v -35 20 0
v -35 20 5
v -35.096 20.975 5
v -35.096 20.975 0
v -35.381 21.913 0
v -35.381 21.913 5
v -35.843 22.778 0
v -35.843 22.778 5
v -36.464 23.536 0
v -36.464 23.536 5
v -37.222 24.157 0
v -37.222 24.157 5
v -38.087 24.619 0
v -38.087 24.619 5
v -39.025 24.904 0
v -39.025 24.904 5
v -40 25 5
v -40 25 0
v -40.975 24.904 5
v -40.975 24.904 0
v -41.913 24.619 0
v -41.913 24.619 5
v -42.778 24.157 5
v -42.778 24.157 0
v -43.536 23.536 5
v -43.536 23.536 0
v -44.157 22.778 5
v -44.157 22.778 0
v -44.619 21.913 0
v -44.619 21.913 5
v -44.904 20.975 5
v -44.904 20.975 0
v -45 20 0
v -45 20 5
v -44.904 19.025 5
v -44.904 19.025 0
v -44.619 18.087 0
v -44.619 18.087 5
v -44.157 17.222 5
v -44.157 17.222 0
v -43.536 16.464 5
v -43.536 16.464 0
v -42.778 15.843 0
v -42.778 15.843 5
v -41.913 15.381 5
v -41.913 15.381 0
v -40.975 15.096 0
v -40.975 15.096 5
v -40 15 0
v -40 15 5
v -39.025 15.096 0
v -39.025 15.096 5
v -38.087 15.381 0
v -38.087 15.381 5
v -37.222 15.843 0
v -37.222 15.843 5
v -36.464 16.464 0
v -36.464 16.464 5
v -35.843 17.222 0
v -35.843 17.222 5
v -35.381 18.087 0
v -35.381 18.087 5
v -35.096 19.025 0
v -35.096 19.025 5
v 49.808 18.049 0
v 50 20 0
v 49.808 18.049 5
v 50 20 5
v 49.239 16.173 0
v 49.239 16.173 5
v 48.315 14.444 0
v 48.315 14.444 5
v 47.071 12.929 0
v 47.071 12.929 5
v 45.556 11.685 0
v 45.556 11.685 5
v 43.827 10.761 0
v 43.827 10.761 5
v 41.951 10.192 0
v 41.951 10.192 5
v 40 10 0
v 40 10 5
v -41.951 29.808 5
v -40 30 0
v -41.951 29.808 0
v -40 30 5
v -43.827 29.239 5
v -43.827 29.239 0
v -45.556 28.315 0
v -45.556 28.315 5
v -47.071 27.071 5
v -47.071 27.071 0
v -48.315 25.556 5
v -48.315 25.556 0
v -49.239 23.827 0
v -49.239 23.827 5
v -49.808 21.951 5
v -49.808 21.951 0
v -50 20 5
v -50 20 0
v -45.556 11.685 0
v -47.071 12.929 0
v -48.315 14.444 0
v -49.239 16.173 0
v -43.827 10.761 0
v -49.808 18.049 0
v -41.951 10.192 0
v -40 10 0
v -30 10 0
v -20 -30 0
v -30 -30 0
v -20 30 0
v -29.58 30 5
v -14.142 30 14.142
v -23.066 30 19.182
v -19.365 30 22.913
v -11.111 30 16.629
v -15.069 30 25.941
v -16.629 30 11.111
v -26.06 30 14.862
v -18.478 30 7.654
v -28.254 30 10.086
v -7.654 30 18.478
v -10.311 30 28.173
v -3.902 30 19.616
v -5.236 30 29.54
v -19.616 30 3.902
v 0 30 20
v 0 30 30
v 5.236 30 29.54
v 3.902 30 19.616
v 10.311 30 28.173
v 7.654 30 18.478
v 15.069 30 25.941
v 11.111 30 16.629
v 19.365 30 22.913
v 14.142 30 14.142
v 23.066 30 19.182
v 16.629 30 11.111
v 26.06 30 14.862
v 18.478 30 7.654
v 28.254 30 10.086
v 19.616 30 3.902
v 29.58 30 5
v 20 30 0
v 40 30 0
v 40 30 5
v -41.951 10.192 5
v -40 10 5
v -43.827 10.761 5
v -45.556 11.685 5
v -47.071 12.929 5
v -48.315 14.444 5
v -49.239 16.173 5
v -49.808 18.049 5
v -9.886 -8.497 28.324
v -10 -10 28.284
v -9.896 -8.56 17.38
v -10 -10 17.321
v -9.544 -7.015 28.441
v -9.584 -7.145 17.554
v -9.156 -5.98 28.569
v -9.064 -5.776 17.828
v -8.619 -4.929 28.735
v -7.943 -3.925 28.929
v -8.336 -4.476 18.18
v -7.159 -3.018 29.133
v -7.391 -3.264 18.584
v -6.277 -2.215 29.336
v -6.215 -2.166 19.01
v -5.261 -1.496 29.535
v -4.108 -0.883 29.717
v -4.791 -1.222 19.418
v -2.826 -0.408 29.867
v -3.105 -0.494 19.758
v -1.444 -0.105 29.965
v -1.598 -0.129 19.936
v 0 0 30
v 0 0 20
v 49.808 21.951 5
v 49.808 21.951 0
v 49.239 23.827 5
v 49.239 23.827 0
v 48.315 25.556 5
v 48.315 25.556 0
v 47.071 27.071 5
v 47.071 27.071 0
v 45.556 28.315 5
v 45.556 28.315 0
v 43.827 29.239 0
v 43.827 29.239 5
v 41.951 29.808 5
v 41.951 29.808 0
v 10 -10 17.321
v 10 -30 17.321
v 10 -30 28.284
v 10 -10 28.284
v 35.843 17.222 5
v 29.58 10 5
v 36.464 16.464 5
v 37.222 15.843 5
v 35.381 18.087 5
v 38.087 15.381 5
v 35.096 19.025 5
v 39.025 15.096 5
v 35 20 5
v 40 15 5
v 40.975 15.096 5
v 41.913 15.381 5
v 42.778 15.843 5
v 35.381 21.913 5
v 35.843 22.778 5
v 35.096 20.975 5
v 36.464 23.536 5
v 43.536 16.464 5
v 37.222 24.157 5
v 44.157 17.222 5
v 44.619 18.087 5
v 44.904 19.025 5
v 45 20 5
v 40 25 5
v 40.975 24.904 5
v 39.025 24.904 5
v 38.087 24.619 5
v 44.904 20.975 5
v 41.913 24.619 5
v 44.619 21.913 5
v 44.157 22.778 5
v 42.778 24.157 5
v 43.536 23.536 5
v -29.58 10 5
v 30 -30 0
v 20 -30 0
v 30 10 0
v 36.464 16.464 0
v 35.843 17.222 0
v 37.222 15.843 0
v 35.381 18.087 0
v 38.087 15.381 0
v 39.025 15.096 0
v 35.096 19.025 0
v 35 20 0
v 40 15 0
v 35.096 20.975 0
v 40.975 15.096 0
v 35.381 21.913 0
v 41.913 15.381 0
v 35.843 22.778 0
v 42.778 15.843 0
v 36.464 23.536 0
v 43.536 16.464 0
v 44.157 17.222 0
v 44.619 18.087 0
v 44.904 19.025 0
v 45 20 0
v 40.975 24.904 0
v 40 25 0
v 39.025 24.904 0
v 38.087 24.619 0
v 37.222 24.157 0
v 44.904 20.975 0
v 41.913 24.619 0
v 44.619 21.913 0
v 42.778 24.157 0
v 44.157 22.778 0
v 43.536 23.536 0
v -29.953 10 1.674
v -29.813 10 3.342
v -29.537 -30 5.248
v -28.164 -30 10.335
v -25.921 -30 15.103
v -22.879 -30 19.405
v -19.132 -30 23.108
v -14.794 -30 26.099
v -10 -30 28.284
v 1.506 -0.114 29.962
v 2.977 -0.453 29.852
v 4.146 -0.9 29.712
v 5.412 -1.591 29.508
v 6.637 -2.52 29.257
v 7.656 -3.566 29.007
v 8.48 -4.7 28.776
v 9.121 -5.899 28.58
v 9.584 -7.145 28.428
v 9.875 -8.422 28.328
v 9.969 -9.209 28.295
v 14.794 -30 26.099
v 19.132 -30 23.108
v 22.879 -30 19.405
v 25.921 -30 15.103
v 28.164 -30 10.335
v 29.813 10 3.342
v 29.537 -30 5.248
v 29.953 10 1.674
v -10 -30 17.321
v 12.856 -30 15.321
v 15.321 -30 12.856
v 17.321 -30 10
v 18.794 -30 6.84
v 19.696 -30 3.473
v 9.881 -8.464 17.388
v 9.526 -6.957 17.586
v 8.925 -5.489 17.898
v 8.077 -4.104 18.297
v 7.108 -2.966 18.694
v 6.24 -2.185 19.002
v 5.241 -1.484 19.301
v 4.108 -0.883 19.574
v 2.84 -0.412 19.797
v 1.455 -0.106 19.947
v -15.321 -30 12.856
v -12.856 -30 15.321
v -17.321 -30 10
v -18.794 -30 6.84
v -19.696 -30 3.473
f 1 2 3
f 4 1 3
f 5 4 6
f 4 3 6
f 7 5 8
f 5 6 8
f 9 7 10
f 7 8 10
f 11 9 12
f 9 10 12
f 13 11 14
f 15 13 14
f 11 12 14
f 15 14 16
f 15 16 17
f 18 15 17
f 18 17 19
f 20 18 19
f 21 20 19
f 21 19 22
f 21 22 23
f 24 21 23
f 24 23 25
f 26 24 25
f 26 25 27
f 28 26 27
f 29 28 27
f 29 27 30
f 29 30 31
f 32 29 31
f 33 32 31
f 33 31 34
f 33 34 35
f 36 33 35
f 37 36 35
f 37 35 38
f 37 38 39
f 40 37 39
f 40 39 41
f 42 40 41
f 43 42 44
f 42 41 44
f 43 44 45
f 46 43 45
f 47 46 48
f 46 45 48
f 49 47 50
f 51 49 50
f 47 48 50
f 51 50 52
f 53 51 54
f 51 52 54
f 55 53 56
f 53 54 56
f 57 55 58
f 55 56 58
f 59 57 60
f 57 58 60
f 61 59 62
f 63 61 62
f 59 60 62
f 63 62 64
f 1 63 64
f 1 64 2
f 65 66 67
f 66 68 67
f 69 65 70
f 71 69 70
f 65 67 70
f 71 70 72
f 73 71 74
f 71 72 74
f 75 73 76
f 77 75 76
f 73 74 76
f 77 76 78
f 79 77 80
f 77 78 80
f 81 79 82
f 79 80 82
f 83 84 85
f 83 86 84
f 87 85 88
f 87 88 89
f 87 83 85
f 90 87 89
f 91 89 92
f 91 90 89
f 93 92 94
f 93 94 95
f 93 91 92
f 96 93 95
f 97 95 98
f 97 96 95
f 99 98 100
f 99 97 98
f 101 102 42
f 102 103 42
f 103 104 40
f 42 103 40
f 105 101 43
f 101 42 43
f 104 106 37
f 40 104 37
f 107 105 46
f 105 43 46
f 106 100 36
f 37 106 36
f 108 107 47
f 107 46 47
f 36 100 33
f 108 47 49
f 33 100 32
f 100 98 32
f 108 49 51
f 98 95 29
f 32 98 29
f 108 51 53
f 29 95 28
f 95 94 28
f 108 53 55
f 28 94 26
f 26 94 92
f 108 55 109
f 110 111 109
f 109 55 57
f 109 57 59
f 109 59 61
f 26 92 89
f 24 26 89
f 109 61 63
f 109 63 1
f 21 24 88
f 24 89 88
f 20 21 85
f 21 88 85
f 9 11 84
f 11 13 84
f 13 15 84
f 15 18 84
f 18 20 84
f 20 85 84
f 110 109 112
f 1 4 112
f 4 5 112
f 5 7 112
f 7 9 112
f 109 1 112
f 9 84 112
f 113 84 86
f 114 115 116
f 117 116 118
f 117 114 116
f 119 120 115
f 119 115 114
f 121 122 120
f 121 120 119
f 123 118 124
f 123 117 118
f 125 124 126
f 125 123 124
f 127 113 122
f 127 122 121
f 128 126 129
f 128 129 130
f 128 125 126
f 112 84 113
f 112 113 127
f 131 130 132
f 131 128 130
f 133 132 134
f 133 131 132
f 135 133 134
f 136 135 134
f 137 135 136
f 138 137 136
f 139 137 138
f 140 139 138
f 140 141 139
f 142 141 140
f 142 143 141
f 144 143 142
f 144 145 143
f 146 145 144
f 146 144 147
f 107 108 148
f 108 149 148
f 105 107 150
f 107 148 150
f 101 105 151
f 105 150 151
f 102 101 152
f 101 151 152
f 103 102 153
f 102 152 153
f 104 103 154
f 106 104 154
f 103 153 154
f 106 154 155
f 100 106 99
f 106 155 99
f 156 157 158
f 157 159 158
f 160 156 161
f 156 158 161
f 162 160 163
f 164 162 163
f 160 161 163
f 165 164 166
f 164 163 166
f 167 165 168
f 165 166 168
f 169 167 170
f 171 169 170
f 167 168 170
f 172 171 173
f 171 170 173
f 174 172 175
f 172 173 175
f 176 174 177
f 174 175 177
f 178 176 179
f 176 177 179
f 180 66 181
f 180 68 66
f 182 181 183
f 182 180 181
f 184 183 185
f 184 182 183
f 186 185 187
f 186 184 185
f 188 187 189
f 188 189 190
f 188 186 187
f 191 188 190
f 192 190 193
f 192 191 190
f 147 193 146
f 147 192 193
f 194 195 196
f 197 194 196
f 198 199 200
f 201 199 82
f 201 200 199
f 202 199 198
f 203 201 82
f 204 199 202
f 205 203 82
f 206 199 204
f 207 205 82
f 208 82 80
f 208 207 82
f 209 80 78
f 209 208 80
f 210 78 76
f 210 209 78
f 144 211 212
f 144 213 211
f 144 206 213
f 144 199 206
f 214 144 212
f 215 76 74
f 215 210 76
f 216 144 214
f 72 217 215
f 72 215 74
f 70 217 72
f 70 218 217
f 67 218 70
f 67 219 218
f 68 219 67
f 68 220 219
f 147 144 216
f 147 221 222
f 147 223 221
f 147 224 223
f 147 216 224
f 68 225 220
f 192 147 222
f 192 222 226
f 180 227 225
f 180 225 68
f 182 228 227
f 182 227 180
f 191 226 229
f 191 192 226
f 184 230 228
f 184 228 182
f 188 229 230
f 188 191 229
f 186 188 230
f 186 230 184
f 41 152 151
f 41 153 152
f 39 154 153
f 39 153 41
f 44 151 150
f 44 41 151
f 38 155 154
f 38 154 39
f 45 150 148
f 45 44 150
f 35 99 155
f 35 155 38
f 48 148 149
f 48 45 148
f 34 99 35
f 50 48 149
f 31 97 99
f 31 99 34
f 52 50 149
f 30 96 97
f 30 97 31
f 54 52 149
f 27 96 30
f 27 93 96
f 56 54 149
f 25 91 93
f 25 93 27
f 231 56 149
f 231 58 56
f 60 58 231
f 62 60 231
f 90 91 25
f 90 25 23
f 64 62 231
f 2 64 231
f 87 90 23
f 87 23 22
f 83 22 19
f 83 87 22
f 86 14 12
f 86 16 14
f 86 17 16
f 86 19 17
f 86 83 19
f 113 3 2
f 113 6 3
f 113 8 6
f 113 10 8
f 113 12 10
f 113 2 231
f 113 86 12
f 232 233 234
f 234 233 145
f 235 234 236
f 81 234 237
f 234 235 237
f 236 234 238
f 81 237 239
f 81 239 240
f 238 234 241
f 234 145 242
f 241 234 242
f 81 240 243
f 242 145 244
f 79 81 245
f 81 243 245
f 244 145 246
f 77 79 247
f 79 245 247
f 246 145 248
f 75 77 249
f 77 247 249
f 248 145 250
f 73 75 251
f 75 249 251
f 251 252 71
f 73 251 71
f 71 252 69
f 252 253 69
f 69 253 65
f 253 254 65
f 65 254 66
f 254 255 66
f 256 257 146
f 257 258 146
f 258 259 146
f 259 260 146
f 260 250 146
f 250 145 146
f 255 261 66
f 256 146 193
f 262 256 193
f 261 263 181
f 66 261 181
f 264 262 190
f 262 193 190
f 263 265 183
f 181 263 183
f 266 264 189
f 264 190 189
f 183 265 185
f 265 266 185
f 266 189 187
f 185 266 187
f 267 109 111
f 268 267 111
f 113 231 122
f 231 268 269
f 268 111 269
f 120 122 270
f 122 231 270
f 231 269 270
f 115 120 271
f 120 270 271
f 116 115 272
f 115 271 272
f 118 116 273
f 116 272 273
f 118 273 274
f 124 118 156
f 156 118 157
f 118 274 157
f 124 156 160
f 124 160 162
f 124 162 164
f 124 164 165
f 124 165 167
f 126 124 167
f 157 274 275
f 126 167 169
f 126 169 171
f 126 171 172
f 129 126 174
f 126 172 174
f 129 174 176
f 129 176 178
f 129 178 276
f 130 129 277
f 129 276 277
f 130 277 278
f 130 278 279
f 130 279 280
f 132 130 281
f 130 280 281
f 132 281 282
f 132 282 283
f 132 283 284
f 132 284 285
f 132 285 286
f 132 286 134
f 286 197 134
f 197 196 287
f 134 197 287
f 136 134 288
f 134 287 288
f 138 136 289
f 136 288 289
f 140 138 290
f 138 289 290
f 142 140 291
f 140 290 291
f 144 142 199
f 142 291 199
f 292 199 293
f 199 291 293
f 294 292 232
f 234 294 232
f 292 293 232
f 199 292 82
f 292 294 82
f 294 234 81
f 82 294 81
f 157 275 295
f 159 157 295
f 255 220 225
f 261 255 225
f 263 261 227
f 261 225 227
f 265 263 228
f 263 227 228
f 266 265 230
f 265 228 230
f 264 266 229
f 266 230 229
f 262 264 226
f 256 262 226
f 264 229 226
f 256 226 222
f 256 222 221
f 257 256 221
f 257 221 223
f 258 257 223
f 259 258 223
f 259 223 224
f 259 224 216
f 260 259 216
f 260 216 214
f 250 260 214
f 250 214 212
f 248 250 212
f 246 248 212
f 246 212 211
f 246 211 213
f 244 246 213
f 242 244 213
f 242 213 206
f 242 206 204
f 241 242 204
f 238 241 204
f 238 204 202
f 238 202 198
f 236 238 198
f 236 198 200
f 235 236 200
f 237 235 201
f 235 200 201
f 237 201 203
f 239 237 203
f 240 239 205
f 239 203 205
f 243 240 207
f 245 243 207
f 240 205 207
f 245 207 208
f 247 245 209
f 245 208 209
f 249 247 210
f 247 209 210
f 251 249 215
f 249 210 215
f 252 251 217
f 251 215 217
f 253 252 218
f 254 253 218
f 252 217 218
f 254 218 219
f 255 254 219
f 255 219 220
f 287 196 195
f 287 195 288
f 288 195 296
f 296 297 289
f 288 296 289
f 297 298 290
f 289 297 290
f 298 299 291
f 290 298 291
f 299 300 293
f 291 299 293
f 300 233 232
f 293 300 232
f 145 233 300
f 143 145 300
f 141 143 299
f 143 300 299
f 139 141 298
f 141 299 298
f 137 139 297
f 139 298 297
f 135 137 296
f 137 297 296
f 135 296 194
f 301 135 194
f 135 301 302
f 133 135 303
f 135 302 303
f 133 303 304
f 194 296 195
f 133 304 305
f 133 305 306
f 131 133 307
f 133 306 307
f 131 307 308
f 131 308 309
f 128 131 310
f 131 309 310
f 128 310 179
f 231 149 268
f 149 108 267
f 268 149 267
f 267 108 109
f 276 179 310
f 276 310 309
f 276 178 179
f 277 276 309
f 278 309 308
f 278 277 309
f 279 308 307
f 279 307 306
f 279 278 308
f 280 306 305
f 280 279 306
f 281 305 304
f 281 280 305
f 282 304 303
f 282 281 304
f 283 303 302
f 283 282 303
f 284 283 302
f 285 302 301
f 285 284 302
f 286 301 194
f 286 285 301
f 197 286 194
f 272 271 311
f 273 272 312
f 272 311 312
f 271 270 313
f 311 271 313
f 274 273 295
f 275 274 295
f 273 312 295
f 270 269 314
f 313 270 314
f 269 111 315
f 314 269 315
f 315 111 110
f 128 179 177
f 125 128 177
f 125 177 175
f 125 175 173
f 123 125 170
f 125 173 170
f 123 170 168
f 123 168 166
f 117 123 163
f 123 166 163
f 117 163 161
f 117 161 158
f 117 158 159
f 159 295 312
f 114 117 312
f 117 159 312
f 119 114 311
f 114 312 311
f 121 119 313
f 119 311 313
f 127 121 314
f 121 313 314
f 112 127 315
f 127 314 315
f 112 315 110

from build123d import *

# Parameters (mm, degrees)
F1_W      = 60
F1_H      = 60
F2_DEPTH  = 30
F4_DEPTH  = 60.001
F5_W      = 20
F5_H      = 20
F6_DEPTH  = 5
F7_W      = 20
F7_H      = 20
F8_DEPTH  = 5
F10_DEPTH = 20
F12_DEPTH = 40
F13_R     = 9.99999
F14_R     = 9.99999
F15_R     = 5
F16_DEPTH = 5.001
F17_R     = 5
F18_DEPTH = 5.001
F20_DEPTH = 30
F21_R     = 10
F22_R     = 9.99999


# Not quite as in the source:
# - a fillet or chamfer is up to 0.001 mm smaller than in the source, because OpenCascade refuses the exact size


with BuildPart() as f2:
    # F1 (on Top) → F2 (new body)
    with BuildSketch(Plane.XY):
        Rectangle(F1_W, F1_H)
    extrude(amount=F2_DEPTH)

    # F3 (on face) → F4 (cut, through all)
    with BuildSketch(Plane.XZ.offset(30)):
        with BuildLine():
            ThreePointArc((20, 0), (14.1421356237, 14.1421356237), (0, 20))
            Line((0, 20), (0, 0))
            Line((0, 0), (20, 0))
        make_face()
        with BuildLine():
            Line((0, 0), (0, 20))
            ThreePointArc((0, 20), (-14.1421356237, 14.1421356237), (-20, 0))
            Line((-20, 0), (0, 0))
        make_face()
    extrude(amount=-F4_DEPTH, mode=Mode.SUBTRACT)

    # F5 (on Top) → F6 (join)
    with BuildSketch(Plane.XY):
        with Locations((40, 20)):
            Rectangle(F5_W, F5_H)
    extrude(amount=F6_DEPTH)

    # F7 (on Top) → F8 (join)
    with BuildSketch(Plane.XY):
        with Locations((-40, 20)):
            Rectangle(F7_W, F7_H)
    extrude(amount=F8_DEPTH)

    # F9 (on face) → F10 (cut)
    with BuildSketch(Plane(origin=(0, 30, 0), x_dir=(-1, 0, 0), z_dir=(0, 1, 0))):
        with BuildLine():
            ThreePointArc((-29.5803989155, 5), (-19.3649167147, 22.9128784886), (4.28e-08, 30))
            Line((4.28e-08, 30), (-30, 30))
            Line((-30, 30), (-30, 5))
            Line((-30, 5), (-29.5803989155, 5))
        make_face()
        with BuildLine():
            ThreePointArc((4.28e-08, 30), (19.3649167474, 22.912878461), (29.5803989155, 5))
            Line((29.5803989155, 5), (30, 5))
            Line((30, 5), (30, 30))
            Line((30, 30), (4.28e-08, 30))
        make_face()
    extrude(amount=-F10_DEPTH, mode=Mode.SUBTRACT)

    # F11 (on face) → F12 (cut)
    with BuildSketch(Plane.XZ.offset(30)):
        with BuildLine():
            Line((-30, 30), (-30, 0))
            ThreePointArc((-30, 0), (-21.2132034683, 21.2132034029), (-9.24e-08, 30))
            Line((-9.24e-08, 30), (-30, 30))
        make_face()
        with BuildLine():
            ThreePointArc((-9.24e-08, 30), (21.2132034029, 21.2132034683), (30, 0))
            Line((30, 0), (30, 30))
            Line((30, 30), (-9.24e-08, 30))
        make_face()
    extrude(amount=-F12_DEPTH, mode=Mode.SUBTRACT)

    # F13 (radius 10 in the source; OpenCascade refuses exactly that, so slightly less here)
    f13_edges = [f2.edges().sort_by_distance(p)[0] for p in [
        (50, 30, 2.5),
        (50, 10, 2.5),
    ]]
    fillet(f13_edges, radius=F13_R)

    # F14 (radius 10 in the source; OpenCascade refuses exactly that, so slightly less here)
    f14_edges = [f2.edges().sort_by_distance(p)[0] for p in [
        (-50, 30, 2.5),
        (-50, 10, 2.5),
    ]]
    fillet(f14_edges, radius=F14_R)

    # F15 (on face) → F16 (cut, through all)
    with BuildSketch(Plane.XY.offset(5)):
        with Locations((-40, 20)):
            Circle(F15_R)
    extrude(amount=-F16_DEPTH, mode=Mode.SUBTRACT)

    # F17 (on face) → F18 (cut, through all)
    with BuildSketch(Plane.XY.offset(5)):
        with Locations((40, 20)):
            Circle(F17_R)
    extrude(amount=-F18_DEPTH, mode=Mode.SUBTRACT)

    # F19 (on face) → F20 (cut)
    with BuildSketch(Plane.XZ.offset(30)):
        with BuildLine():
            Line((10, 17.3205080757), (10, 28.2842712437))
            ThreePointArc((10.0000000012, 28.284271247), (1.3e-09, 30), (-9.9999999988, 28.2842712479))
            Line((-10, 28.2842712513), (-10, 17.3205080757))
            ThreePointArc((-10, 17.3205080757), (0, 20), (10, 17.3205080757))
        make_face()
    extrude(amount=-F20_DEPTH, mode=Mode.SUBTRACT)

    # F21
    f21_edges = [f2.edges().sort_by_distance(p)[0] for p in [
        (-10, 0, 22.80239),
    ]]
    fillet(f21_edges, radius=F21_R)

    # F22 (radius 10 in the source; OpenCascade refuses exactly that, so slightly less here)
    f22_edges = [f2.edges().sort_by_distance(p)[0] for p in [
        (10, 0, 22.80239),
    ]]
    fillet(f22_edges, radius=F22_R)


solid = f2.part
